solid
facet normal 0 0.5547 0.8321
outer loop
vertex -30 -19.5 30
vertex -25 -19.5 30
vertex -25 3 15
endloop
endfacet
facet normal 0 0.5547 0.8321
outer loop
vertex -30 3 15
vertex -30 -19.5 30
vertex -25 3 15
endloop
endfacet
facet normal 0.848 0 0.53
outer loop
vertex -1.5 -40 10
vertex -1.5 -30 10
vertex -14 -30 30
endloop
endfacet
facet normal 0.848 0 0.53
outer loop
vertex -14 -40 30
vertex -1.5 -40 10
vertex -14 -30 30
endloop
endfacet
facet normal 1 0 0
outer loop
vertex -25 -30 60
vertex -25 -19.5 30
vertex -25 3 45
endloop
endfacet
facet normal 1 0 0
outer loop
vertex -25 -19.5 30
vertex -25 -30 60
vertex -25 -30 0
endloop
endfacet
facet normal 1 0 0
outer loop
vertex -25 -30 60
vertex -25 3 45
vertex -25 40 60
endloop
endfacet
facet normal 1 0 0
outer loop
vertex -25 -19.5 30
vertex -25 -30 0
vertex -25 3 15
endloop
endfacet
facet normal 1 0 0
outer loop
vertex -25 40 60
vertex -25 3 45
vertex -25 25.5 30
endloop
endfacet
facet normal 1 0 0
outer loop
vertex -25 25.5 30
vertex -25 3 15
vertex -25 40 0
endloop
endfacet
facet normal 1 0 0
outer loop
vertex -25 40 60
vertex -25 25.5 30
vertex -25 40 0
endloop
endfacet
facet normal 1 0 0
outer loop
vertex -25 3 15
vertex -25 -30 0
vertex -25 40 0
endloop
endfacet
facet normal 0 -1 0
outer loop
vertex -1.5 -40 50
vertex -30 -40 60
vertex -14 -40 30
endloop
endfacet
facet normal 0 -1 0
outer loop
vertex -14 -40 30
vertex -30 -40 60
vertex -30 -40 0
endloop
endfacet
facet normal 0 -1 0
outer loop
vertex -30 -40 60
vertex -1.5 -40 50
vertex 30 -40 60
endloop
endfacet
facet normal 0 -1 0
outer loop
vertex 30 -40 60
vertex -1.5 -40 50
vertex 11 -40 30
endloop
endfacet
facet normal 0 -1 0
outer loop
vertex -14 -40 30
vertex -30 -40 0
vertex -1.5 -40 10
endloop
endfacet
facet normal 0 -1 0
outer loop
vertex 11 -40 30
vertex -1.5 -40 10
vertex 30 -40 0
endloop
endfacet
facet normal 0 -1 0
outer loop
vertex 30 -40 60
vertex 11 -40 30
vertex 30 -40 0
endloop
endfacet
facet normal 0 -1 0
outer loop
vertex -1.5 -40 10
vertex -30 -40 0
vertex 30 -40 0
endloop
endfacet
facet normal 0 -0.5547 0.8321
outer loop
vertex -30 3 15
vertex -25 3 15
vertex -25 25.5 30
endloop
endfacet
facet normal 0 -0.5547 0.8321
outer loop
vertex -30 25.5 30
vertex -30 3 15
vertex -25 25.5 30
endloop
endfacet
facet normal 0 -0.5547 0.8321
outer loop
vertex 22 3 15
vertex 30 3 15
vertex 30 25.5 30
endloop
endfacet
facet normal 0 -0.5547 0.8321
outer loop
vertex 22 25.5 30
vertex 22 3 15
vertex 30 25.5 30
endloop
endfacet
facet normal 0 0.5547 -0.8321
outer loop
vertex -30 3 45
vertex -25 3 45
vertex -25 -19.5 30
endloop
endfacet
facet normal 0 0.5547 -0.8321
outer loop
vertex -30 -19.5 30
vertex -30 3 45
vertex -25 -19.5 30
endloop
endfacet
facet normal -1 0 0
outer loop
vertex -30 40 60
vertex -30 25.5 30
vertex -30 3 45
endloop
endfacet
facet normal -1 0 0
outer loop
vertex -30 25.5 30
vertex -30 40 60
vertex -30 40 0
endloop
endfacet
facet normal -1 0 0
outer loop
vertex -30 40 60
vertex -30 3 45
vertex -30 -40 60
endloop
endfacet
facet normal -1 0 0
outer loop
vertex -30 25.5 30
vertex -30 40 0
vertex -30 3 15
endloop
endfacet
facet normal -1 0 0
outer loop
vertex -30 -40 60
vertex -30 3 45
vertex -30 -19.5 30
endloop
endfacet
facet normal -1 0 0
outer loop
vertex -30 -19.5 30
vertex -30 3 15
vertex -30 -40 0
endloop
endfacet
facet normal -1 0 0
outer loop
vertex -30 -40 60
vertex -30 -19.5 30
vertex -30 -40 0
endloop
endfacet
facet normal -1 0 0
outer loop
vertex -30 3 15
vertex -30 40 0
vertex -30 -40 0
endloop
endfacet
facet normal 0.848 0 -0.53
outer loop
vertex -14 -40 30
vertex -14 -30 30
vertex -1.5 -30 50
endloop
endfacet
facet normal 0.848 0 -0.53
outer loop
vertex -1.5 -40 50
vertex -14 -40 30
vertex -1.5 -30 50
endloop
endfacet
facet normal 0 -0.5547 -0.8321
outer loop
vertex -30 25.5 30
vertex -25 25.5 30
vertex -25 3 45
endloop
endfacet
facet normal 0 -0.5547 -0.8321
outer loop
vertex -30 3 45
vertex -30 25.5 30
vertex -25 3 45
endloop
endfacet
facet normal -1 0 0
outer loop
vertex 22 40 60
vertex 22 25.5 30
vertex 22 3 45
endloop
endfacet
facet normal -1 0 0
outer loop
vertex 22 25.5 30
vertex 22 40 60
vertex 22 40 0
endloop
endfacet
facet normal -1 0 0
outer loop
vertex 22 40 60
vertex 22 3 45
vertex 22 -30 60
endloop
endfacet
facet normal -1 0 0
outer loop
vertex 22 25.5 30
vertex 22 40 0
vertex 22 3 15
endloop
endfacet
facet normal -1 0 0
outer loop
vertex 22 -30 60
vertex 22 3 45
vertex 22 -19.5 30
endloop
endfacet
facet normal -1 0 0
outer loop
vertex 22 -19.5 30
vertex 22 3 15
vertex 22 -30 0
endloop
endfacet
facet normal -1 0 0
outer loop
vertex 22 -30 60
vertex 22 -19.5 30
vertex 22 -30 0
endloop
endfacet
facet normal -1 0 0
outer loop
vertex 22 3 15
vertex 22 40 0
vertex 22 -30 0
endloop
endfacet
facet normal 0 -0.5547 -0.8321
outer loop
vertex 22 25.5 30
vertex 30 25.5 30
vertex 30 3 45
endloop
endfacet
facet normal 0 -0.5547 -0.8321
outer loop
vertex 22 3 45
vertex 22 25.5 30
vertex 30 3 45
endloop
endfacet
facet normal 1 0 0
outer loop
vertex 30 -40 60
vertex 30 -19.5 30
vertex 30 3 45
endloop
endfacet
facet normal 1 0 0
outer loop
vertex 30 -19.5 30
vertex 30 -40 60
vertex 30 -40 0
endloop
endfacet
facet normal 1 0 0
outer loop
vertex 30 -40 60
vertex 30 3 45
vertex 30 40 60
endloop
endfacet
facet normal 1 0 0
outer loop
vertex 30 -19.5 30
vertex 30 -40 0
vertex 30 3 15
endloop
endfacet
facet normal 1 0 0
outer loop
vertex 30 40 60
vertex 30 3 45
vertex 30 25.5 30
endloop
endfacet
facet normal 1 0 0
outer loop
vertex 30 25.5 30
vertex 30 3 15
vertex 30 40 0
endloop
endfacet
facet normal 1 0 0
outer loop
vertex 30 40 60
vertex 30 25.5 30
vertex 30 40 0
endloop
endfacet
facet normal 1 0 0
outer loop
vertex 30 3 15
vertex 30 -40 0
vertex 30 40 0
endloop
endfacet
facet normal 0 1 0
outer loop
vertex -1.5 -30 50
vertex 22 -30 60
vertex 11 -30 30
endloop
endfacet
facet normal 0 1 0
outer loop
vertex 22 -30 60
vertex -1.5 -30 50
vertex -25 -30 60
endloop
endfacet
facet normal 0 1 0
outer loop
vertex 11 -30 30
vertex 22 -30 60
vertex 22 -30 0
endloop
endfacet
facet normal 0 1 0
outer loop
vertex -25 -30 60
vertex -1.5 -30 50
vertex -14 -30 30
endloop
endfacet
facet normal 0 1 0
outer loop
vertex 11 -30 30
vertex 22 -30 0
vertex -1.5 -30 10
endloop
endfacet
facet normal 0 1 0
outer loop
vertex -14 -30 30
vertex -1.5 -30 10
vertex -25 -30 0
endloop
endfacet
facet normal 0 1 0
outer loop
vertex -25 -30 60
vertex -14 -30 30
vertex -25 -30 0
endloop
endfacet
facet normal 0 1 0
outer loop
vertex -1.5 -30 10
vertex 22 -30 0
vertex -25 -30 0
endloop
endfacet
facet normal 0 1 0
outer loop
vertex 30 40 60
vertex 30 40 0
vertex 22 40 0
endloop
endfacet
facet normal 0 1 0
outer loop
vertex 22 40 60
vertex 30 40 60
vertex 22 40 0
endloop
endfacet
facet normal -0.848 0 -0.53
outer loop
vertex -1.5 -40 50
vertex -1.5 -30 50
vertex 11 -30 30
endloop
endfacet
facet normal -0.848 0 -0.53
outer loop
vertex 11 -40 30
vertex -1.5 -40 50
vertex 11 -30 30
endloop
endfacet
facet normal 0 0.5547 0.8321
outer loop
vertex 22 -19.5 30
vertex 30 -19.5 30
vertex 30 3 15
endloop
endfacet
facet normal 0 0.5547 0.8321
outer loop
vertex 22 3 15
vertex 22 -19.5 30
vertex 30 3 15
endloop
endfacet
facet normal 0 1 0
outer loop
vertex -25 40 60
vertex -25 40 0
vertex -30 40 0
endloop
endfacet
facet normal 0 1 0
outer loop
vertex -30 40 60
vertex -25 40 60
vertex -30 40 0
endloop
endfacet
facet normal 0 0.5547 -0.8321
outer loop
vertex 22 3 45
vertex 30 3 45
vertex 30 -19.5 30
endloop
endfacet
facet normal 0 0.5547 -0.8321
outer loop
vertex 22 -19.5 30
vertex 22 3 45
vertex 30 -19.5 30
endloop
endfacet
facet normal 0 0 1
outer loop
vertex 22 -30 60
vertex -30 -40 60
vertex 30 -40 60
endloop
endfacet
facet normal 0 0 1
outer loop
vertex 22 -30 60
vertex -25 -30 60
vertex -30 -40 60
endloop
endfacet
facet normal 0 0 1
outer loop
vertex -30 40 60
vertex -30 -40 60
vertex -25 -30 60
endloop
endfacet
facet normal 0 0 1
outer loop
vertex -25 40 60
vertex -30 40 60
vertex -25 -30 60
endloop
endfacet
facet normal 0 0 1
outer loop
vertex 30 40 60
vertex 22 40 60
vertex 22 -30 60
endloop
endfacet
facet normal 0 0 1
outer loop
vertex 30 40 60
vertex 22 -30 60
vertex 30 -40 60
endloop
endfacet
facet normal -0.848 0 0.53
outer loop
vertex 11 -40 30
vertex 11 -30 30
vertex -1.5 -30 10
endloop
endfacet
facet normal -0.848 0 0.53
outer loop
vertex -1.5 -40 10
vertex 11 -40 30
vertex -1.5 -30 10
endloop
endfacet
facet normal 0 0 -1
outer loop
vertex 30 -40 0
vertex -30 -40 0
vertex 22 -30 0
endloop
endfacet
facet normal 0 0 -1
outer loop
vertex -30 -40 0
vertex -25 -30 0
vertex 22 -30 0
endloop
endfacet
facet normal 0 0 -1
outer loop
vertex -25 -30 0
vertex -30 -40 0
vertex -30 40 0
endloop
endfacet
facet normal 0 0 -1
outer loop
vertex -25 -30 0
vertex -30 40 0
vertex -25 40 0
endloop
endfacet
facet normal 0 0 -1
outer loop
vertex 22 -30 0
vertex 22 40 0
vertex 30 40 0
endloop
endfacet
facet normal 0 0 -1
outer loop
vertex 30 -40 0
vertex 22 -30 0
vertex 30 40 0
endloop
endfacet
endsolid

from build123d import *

# Parameters (mm, degrees)
F1_DEPTH = 60
F3_DEPTH = 60.001
F5_DEPTH = 80.001


with BuildPart() as f1:
    # F0 (on Top) → F1 (new body)
    with BuildSketch(Plane.XY):
        Polygon((-30, 40), (-30, -40), (30, -40), (30, 40), (22, 40), (22, 36), (22, -30), (-25, -30), (-25, 36), (-25, 40), align=None)
    extrude(amount=F1_DEPTH)

    # F2 (on face) → F3 (cut, through all)
    with BuildSketch(Plane.YZ.offset(30)):
        Polygon((3, 45), (-19.5, 30), (3, 15), (25.5, 30), align=None)
    extrude(amount=-F3_DEPTH, mode=Mode.SUBTRACT)

    # F4 (on face) → F5 (cut, through all)
    with BuildSketch(Plane(origin=(0, 40, 0), x_dir=(-1, 0, 0), z_dir=(0, 1, 0))):
        Polygon((14, 30), (1.5, 50), (-11, 30), (1.5, 10), align=None)
    extrude(amount=-F5_DEPTH, mode=Mode.SUBTRACT)


solid = f1.part
